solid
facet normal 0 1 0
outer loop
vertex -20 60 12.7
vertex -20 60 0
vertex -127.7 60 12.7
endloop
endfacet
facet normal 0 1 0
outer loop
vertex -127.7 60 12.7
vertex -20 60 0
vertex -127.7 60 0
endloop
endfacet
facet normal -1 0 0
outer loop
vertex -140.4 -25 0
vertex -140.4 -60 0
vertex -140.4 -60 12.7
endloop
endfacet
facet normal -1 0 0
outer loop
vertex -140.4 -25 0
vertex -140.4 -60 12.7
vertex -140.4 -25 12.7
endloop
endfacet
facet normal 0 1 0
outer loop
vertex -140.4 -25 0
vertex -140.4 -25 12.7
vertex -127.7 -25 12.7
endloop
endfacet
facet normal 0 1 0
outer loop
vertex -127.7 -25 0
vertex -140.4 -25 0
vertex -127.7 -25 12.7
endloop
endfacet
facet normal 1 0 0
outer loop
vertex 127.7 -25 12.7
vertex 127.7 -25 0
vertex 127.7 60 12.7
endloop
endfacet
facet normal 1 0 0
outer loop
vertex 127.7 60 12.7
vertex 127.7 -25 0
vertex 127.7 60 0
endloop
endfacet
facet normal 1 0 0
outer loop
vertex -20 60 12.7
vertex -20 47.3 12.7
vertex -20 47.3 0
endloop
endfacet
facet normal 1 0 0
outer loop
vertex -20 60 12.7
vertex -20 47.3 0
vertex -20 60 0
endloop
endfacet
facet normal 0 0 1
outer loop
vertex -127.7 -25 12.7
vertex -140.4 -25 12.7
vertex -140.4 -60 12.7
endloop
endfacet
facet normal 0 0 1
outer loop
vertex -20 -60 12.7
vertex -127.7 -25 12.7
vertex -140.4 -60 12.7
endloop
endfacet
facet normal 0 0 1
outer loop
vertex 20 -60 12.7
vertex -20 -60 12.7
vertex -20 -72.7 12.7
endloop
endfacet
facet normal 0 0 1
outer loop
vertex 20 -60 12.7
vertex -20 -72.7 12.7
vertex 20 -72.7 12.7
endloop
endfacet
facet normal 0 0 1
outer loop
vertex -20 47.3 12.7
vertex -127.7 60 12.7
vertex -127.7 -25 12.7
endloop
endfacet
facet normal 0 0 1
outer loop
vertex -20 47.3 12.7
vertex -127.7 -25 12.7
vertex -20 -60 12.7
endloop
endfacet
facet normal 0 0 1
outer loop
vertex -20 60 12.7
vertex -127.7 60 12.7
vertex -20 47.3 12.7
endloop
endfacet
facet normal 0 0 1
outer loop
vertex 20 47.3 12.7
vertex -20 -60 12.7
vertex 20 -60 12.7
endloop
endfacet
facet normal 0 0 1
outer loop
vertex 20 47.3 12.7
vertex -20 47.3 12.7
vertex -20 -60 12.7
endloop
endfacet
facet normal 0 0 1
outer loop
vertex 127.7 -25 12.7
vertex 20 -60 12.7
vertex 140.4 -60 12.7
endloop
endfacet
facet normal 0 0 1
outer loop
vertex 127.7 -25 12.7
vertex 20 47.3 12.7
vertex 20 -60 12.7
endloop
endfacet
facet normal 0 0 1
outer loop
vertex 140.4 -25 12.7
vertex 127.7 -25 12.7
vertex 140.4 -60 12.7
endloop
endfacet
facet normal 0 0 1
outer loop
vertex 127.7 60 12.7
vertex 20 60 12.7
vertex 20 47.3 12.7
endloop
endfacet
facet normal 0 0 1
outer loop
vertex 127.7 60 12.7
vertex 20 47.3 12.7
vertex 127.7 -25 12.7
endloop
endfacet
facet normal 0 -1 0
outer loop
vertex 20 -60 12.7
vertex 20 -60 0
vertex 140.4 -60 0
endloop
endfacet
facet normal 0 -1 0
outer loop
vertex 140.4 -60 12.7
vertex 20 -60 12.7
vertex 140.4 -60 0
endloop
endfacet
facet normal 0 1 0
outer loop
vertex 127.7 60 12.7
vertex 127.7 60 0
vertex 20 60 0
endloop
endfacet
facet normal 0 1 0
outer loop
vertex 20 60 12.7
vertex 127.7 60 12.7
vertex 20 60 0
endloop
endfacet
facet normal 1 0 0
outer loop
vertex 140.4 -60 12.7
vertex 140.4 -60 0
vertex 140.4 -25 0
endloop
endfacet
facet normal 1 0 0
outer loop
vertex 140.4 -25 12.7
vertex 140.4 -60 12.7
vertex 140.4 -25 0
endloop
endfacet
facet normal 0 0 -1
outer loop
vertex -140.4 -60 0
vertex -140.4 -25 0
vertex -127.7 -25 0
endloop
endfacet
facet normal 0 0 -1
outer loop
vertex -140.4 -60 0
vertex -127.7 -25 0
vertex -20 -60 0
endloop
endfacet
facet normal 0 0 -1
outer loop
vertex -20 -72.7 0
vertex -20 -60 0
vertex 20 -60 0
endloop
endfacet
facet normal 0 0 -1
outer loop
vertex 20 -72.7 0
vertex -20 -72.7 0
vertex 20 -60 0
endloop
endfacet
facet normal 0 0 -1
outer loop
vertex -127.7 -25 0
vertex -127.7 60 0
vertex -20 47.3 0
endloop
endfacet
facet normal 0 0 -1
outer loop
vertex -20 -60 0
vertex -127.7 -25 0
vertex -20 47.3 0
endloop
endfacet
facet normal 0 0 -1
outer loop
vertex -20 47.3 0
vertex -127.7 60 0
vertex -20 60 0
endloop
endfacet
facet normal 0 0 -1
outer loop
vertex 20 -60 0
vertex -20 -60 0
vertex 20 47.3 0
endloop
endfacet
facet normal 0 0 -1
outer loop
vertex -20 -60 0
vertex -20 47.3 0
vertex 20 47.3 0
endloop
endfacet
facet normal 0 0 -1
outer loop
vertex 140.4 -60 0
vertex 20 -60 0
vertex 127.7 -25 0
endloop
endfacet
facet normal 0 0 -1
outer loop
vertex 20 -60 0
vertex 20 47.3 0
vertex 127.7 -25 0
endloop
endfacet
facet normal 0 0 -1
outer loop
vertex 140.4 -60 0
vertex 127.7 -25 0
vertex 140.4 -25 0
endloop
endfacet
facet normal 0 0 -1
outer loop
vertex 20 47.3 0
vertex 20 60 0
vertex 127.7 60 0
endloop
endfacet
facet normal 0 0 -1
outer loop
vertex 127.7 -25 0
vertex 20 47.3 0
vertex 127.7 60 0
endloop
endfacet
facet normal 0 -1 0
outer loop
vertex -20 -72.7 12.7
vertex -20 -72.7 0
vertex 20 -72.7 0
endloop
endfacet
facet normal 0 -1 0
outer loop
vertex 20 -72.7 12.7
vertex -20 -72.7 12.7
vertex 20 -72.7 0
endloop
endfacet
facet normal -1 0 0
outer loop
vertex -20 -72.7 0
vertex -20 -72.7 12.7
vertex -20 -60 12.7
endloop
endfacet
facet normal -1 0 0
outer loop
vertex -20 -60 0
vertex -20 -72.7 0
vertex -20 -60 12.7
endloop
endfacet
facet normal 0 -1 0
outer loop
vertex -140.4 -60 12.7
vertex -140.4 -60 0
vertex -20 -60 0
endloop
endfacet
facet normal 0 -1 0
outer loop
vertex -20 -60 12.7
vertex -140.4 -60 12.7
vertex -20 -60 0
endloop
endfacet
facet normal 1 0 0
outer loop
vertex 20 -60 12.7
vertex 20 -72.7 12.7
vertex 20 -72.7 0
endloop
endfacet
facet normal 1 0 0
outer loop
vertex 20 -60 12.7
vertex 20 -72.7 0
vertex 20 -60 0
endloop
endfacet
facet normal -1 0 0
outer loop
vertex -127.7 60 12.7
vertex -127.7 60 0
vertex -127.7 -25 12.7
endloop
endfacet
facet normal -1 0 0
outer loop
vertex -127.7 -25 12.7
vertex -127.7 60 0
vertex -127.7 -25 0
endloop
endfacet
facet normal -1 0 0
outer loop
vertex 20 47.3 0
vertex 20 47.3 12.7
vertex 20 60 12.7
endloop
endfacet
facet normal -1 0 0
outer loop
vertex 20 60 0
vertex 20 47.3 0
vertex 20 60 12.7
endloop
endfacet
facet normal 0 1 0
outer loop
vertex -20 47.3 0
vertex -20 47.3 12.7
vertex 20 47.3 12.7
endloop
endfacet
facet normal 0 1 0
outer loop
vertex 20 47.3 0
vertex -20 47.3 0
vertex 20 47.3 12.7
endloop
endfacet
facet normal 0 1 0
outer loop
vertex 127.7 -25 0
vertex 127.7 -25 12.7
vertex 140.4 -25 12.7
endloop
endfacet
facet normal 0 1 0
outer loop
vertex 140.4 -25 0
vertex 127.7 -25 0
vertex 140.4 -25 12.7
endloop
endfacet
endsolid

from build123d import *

# Parameters (mm, degrees)
SKETCH3_W           = 12.7
SKETCH3_H           = 35
SKETCH3_W_2         = 40
SKETCH3_H_2         = 12.7
BOSS_EXTRUDE1_DEPTH = 12.7
SKETCH4_W           = 40
SKETCH4_H           = 12.7
CUT_EXTRUDE1_DEPTH  = 12.7


with BuildPart() as part:
    # Sketch3 → Boss-Extrude1 (new body)
    with BuildSketch(Plane.XY):
        Polygon((127.7, 60), (-127.7, 60), (-127.7, -25), (-127.7, -60), (-20, -60), (20, -60), (127.7, -60), (127.7, -25), align=None)
        with Locations((-134.05, -42.5)):
            Rectangle(SKETCH3_W, SKETCH3_H)
        with Locations((134.05, -42.5)):
            Rectangle(SKETCH3_W, SKETCH3_H)
        with Locations((0, -66.35)):
            Rectangle(SKETCH3_W_2, SKETCH3_H_2)
    extrude(amount=BOSS_EXTRUDE1_DEPTH)

    # Sketch4 → Cut-Extrude1 (cut)
    with BuildSketch(Plane.XY.offset(12.7)):
        with Locations((0, 53.65)):
            Rectangle(SKETCH4_W, SKETCH4_H)
    extrude(amount=-CUT_EXTRUDE1_DEPTH, mode=Mode.SUBTRACT)


solid = part.part
